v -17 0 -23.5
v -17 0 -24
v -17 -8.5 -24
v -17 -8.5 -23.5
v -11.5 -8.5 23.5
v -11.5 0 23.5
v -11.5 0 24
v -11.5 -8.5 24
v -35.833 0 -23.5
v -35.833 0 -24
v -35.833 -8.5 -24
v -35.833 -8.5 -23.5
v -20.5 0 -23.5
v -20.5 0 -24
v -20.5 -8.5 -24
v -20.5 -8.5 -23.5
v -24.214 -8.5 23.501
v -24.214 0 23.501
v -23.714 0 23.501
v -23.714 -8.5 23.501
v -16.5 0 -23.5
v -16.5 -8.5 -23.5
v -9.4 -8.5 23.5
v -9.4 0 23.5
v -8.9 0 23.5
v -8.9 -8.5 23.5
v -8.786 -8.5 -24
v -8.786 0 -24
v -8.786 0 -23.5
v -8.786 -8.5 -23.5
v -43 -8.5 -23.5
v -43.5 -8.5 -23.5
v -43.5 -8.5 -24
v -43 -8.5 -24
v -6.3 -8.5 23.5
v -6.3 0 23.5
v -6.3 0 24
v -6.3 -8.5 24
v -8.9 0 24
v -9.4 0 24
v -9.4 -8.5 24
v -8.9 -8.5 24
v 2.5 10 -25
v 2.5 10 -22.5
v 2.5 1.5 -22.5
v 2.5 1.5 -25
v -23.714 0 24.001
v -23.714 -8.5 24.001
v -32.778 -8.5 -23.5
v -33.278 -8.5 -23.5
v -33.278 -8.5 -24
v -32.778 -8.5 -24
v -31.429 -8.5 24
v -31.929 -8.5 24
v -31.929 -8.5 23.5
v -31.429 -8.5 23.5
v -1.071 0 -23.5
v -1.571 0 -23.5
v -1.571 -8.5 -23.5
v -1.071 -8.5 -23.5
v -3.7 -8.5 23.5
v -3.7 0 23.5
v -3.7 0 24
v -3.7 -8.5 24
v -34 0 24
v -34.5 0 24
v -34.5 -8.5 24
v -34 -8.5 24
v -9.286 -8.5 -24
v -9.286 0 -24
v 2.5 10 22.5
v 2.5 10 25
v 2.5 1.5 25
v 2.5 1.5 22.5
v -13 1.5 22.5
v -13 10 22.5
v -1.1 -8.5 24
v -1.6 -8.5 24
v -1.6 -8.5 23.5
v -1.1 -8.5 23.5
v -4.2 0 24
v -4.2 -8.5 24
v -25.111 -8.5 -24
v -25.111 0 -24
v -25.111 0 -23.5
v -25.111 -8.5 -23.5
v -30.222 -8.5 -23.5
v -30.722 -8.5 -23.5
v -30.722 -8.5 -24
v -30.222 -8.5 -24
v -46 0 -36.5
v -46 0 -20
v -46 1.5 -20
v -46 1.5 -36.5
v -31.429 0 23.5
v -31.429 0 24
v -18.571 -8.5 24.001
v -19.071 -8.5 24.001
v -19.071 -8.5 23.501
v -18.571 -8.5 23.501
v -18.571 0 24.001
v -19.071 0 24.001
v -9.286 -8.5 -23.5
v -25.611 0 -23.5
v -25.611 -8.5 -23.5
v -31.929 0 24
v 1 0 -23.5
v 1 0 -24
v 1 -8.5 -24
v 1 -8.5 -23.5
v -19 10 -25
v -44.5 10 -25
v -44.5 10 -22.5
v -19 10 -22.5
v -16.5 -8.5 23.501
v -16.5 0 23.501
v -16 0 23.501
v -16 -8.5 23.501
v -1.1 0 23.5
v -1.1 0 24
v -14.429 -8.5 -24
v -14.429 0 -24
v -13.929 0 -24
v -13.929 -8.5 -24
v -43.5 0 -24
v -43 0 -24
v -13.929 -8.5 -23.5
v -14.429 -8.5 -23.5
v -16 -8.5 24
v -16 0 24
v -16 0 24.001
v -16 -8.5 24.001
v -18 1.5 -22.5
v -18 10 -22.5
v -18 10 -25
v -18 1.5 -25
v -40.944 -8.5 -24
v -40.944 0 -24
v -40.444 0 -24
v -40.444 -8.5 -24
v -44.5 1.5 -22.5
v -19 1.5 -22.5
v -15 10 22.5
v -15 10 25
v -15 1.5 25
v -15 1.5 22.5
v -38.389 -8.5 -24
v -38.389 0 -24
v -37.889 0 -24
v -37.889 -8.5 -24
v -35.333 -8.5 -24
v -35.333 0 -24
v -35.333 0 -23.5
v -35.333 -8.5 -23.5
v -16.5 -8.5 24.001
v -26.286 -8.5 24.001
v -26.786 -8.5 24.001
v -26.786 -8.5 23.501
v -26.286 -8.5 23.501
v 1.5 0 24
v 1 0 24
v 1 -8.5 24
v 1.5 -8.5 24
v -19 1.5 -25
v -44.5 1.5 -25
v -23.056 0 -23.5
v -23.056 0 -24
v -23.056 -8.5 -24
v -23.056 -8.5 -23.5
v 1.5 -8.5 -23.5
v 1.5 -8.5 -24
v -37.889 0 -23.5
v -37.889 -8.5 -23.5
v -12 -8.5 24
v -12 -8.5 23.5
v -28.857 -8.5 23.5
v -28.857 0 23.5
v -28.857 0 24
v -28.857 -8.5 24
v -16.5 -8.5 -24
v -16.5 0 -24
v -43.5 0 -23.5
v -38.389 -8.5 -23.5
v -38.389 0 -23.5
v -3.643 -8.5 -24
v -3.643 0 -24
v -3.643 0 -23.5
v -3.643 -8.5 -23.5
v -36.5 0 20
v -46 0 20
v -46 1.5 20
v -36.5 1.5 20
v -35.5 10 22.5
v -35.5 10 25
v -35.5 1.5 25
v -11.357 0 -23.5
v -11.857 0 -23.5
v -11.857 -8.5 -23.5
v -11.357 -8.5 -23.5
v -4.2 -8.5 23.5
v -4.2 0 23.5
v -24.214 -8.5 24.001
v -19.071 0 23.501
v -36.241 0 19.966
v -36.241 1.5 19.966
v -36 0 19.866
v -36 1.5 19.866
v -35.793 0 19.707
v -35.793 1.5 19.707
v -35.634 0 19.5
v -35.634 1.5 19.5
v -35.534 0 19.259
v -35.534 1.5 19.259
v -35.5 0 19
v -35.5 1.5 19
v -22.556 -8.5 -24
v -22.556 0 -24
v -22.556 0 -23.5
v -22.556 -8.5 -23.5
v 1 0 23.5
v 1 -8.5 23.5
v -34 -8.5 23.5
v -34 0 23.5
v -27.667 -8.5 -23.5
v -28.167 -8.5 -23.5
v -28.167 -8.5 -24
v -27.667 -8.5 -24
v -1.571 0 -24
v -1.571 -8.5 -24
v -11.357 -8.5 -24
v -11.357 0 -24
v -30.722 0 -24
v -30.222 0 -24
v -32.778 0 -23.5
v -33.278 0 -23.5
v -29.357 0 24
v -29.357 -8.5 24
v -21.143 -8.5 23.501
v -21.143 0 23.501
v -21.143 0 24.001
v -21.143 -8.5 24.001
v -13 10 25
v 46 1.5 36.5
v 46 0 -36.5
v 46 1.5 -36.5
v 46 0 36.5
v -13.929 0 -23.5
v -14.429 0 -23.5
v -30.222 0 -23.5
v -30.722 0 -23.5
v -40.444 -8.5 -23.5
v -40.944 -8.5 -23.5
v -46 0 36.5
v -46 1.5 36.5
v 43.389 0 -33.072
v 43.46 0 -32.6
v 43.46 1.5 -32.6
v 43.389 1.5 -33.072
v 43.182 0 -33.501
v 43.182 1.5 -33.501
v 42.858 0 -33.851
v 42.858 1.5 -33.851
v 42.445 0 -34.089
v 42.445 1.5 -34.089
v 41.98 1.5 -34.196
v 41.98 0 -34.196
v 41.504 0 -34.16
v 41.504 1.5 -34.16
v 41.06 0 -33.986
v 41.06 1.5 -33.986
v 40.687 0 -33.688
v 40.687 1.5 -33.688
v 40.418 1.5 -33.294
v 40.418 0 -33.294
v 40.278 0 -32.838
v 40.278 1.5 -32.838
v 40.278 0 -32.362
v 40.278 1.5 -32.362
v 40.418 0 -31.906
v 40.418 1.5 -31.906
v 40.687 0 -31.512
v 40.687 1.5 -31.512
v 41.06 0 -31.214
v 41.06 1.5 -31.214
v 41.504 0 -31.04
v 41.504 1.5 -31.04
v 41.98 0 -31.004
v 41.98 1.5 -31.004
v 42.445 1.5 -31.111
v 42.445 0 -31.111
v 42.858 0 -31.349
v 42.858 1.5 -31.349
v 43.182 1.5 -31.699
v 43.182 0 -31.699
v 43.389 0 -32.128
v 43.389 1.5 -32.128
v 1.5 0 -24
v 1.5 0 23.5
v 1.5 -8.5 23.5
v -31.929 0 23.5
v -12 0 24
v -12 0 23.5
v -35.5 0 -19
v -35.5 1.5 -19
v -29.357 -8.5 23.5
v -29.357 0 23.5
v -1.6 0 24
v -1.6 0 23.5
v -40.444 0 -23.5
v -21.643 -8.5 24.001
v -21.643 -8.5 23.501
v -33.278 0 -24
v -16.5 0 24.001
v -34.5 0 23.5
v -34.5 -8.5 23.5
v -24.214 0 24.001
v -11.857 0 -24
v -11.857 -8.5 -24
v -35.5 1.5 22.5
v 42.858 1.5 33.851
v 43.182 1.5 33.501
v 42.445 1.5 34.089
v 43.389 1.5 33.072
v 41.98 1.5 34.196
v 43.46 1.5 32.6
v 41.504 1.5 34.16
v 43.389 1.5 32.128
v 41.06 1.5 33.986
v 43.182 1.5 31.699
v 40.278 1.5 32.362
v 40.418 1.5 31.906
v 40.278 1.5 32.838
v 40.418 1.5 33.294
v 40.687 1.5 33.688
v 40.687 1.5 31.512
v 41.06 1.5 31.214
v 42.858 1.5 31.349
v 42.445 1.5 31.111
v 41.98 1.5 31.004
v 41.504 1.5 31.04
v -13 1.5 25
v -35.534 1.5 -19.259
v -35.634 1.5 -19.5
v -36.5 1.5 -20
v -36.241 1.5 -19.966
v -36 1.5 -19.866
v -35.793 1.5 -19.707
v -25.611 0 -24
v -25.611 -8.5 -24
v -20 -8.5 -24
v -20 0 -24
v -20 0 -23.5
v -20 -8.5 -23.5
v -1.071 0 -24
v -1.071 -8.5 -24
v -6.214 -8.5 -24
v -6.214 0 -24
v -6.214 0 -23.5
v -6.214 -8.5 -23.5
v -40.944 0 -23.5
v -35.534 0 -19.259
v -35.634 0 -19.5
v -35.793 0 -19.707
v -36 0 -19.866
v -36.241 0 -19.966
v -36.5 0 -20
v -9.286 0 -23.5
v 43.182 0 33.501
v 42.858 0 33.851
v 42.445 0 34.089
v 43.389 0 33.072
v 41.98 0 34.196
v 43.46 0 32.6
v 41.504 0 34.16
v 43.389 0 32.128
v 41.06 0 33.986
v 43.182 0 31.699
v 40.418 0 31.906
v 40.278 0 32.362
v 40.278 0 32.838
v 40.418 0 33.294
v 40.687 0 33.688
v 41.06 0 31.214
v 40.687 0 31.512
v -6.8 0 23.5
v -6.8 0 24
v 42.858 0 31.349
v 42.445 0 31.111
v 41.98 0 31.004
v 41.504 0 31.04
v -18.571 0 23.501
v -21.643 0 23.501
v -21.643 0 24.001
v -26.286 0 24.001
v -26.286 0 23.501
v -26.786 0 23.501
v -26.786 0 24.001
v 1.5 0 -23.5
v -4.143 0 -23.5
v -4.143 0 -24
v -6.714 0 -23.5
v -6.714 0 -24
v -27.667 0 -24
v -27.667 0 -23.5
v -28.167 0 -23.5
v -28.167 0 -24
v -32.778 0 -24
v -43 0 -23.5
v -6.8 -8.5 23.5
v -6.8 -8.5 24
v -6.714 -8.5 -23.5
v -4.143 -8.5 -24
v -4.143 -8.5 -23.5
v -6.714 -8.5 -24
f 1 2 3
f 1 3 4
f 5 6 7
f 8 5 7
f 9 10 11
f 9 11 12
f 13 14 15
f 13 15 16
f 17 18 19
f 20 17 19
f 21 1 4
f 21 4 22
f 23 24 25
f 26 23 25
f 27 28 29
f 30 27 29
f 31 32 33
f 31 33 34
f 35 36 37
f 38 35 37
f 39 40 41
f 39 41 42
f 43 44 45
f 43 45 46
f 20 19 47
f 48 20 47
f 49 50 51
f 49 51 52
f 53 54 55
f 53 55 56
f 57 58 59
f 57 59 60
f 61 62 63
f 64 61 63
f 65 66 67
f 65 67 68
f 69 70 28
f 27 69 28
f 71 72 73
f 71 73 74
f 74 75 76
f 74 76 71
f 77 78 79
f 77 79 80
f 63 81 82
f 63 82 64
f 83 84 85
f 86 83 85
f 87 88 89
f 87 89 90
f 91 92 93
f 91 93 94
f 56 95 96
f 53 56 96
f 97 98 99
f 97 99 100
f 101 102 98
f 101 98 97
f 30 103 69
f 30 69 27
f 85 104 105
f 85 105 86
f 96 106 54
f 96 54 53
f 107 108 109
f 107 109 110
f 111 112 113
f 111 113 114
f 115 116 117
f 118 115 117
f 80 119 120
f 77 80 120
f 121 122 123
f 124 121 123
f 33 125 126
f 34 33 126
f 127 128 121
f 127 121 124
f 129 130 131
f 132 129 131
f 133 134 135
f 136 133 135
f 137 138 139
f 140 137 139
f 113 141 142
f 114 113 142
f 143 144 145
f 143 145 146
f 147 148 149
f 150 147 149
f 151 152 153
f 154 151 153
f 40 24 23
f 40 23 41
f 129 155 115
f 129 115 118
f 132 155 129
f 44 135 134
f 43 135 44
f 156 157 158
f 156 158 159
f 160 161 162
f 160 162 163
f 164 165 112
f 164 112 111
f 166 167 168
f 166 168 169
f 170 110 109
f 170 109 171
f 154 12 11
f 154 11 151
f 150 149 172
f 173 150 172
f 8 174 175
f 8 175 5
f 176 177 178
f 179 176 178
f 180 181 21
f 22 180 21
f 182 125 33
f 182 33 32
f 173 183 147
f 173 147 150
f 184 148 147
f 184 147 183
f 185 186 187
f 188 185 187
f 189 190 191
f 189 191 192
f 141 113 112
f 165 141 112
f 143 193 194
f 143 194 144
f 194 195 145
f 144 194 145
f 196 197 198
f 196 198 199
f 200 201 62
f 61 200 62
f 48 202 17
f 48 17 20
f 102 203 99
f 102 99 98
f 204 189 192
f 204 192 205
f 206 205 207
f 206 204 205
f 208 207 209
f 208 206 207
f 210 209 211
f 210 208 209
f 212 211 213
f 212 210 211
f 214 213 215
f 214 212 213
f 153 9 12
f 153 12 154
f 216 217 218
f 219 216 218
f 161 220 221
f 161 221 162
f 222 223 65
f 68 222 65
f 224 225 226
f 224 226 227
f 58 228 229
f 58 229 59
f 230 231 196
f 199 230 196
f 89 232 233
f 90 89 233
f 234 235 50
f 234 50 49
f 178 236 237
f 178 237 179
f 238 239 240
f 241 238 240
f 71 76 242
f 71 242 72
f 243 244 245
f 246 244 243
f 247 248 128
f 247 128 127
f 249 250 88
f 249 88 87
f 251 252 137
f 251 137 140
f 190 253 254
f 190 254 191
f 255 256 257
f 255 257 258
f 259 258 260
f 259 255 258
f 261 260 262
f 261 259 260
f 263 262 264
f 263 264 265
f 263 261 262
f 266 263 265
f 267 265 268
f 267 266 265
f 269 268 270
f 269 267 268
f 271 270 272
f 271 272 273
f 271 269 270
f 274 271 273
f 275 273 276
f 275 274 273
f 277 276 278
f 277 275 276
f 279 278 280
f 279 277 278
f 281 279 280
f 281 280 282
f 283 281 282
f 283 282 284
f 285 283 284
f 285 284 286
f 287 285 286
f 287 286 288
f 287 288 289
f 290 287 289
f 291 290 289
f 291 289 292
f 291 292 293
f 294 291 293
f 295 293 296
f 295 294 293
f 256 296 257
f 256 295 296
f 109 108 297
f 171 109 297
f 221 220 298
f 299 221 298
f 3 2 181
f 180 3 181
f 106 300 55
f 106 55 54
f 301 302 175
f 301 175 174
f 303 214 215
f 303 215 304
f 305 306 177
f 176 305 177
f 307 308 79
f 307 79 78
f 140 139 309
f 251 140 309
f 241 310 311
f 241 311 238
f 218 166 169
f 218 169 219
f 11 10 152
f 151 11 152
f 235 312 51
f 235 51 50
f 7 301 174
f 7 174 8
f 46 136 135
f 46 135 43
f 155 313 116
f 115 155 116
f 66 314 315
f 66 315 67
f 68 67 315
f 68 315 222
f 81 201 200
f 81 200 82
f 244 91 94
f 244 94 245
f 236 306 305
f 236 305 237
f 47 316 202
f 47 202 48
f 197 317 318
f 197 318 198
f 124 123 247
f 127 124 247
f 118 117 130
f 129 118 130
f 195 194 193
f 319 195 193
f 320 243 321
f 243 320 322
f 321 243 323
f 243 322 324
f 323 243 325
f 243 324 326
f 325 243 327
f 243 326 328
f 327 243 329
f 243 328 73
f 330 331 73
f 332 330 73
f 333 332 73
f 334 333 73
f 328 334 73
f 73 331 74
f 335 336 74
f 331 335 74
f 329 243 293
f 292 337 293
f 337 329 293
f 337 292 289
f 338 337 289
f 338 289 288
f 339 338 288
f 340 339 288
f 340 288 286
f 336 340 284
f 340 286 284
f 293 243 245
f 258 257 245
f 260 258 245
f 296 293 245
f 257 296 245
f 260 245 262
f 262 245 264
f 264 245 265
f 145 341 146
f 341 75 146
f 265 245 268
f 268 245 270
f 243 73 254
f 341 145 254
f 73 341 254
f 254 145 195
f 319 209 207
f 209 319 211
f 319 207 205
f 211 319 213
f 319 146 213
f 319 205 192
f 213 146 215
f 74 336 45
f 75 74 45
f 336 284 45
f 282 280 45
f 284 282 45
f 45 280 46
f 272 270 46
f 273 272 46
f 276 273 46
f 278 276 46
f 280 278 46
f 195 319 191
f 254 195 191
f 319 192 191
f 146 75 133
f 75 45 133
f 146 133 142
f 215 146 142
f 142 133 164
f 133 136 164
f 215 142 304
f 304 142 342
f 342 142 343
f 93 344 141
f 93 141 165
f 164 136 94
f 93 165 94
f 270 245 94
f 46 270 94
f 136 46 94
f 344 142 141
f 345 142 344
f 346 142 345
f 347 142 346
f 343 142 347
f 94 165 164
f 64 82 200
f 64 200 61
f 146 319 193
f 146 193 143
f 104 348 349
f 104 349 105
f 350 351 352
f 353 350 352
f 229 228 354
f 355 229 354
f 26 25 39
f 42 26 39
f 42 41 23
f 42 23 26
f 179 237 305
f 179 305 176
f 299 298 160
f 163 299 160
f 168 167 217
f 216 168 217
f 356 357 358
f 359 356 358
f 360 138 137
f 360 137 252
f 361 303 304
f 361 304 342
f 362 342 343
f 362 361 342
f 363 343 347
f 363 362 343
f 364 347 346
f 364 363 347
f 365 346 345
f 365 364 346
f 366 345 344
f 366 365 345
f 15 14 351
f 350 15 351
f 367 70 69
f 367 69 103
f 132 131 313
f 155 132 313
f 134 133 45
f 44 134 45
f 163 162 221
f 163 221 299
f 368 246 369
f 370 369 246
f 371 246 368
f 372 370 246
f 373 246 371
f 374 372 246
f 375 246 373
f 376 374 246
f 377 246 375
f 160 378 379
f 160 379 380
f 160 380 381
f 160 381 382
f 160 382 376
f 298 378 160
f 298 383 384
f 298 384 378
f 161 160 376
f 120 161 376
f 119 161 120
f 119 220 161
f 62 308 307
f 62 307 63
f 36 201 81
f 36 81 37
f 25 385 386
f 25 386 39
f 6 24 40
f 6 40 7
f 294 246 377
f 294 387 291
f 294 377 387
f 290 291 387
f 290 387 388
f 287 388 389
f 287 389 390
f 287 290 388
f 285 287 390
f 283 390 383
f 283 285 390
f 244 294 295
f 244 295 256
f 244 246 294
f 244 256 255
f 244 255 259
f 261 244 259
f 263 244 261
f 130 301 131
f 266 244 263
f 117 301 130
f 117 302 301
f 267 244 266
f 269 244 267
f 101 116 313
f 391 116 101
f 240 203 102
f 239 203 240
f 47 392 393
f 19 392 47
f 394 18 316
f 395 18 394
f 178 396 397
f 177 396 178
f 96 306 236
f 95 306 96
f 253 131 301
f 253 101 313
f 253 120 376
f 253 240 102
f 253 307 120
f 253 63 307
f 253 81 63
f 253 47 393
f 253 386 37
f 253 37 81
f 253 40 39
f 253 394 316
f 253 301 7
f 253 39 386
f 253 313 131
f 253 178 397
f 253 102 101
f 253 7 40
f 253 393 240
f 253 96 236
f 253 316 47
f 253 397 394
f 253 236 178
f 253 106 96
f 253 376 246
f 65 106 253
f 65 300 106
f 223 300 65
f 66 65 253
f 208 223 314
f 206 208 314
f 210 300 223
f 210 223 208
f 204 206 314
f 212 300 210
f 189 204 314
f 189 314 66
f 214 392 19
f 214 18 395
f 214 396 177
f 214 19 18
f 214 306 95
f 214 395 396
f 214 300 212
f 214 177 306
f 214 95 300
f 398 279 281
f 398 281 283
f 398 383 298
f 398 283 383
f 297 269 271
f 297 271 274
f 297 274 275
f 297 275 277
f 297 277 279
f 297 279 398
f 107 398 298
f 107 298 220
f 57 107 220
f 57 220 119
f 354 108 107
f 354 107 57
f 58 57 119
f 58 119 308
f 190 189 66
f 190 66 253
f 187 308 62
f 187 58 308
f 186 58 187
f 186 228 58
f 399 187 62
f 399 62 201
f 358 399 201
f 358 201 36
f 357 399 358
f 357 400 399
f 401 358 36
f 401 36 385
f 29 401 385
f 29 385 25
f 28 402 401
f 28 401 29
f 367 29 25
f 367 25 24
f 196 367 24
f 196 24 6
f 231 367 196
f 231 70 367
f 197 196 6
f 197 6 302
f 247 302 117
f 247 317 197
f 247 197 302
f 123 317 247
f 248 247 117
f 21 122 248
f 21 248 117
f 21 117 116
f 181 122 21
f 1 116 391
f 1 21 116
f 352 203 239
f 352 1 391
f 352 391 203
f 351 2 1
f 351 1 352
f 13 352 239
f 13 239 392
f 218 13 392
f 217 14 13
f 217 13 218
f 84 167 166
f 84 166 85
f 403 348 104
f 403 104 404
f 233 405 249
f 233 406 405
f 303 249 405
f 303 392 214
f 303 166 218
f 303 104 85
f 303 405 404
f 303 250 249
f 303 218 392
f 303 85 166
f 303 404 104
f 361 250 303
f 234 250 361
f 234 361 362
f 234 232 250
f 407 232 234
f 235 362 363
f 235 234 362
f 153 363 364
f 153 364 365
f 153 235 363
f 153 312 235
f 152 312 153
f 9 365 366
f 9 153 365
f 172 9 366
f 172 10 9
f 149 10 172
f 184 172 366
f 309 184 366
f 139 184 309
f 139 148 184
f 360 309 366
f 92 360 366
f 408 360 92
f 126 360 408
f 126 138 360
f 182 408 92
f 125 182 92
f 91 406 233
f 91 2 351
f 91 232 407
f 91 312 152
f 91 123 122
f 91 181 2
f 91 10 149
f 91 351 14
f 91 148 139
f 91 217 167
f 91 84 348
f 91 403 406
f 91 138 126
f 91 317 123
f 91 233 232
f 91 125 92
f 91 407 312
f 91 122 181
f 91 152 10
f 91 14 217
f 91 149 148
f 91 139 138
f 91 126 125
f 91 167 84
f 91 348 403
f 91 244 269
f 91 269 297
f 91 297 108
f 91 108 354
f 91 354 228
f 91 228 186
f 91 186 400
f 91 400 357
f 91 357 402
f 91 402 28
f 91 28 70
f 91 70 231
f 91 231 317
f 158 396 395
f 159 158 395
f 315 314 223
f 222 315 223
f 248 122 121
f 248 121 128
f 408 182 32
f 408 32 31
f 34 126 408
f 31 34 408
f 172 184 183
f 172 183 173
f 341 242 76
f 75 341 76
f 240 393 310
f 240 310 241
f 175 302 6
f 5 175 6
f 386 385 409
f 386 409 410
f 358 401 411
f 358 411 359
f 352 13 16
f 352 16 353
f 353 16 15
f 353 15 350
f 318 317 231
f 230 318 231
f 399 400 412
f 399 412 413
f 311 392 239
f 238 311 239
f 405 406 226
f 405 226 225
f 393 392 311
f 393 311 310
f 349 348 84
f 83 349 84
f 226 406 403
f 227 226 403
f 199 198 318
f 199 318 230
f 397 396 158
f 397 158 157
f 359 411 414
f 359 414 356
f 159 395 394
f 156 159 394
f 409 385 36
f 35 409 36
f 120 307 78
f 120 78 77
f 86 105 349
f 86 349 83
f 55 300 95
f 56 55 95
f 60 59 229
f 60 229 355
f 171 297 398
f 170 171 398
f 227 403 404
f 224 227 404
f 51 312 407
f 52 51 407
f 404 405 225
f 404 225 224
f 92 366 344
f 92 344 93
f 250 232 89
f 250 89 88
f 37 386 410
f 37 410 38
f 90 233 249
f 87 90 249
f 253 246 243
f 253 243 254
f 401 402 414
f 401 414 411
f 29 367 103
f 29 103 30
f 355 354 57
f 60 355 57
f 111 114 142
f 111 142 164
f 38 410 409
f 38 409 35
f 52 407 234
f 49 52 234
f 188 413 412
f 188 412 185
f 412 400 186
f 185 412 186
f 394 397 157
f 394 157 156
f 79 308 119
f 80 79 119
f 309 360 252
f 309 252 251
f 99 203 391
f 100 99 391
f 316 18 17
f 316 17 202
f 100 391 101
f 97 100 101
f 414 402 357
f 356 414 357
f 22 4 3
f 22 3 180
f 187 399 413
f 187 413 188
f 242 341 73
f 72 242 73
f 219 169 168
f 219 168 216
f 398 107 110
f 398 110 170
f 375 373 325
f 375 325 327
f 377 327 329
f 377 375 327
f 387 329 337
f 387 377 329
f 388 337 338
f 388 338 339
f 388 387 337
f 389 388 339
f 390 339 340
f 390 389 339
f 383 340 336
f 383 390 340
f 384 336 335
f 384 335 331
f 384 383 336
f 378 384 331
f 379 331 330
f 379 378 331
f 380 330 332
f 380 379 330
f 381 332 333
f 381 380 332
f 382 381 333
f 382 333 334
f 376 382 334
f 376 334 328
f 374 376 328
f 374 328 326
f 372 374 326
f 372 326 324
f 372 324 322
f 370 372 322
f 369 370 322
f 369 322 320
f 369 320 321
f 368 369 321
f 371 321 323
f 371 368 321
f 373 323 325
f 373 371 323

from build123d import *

# Parameters (mm, degrees)
SZKIC1_R                    = 1.6
DODANIE_WYCI_GNI_CIE1_DEPTH = 1.5
SZKIC2_W                    = 15.5
SZKIC2_H                    = 2.5
SZKIC2_W_2                  = 20.5
SZKIC2_W_3                  = 25.5
DODANIE_WYCI_GNI_CIE2_DEPTH = 8.5
SZKIC3_W                    = 0.5
SZKIC3_H                    = 0.5
DODANIE_WYCI_GNI_CIE3_DEPTH = 8.5


with BuildPart() as part:
    # Szkic1 → Dodanie-wyciągnięcie1 (new body)
    with BuildSketch(Plane(origin=(0, 0, 0), x_dir=(1, 0, 0), z_dir=(0, 1, 0))):
        with BuildLine():
            Line((-46, 36.5), (46, 36.5))
            Line((46, 36.5), (46, -36.5))
            Line((46, -36.5), (-46, -36.5))
            Line((-46, -36.5), (-46, -20))
            Line((-46, -20), (-36.5, -20))
            ThreePointArc((-36.5, -20), (-35.792893219, -19.707106781), (-35.5, -19))
            Line((-35.5, -19), (-35.5, 19))
            ThreePointArc((-35.5, 19), (-35.792893219, 19.707106781), (-36.5, 20))
            Line((-36.5, 20), (-46, 20))
            Line((-46, 20), (-46, 36.5))
        make_face()
        with Locations((41.86, 32.6)):
            Circle(SZKIC1_R, mode=Mode.SUBTRACT)
        with Locations((41.86, -32.6)):
            Circle(SZKIC1_R, mode=Mode.SUBTRACT)
    extrude(amount=DODANIE_WYCI_GNI_CIE1_DEPTH)

    # Szkic2 → Dodanie-wyciągnięcie2 (add)
    with BuildSketch(Plane(origin=(0, 1.5, 0), x_dir=(1, 0, 0), z_dir=(0, 1, 0))):
        with Locations((-5.25, -23.75)):
            Rectangle(SZKIC2_W, SZKIC2_H)
        with Locations((-25.25, -23.75)):
            Rectangle(SZKIC2_W_2, SZKIC2_H)
        with Locations((-7.75, 23.75)):
            Rectangle(SZKIC2_W_2, SZKIC2_H)
        with Locations((-31.75, 23.75)):
            Rectangle(SZKIC2_W_3, SZKIC2_H)
    extrude(amount=DODANIE_WYCI_GNI_CIE2_DEPTH)

    # Szkic3 → Dodanie-wyciągnięcie3 (add)
    with BuildSketch(Plane.XZ):
        with Locations((-43.25, -23.75)):
            Rectangle(SZKIC3_W, SZKIC3_H)
        with Locations((-40.694444444, -23.75)):
            Rectangle(SZKIC3_W, SZKIC3_H)
        with Locations((-38.138888889, -23.75)):
            Rectangle(SZKIC3_W, SZKIC3_H)
        with Locations((-35.583333333, -23.75)):
            Rectangle(SZKIC3_W, SZKIC3_H)
        with Locations((-33.027777778, -23.75)):
            Rectangle(SZKIC3_W, SZKIC3_H)
        with Locations((-30.472222222, -23.75)):
            Rectangle(SZKIC3_W, SZKIC3_H)
        with Locations((-27.916666667, -23.75)):
            Rectangle(SZKIC3_W, SZKIC3_H)
        with Locations((-25.361111111, -23.75)):
            Rectangle(SZKIC3_W, SZKIC3_H)
        with Locations((-22.805555556, -23.75)):
            Rectangle(SZKIC3_W, SZKIC3_H)
        with Locations((-20.25, -23.75)):
            Rectangle(SZKIC3_W, SZKIC3_H)
        with Locations((-16.75, -23.75)):
            Rectangle(SZKIC3_W, SZKIC3_H)
        with Locations((-14.178571429, -23.75)):
            Rectangle(SZKIC3_W, SZKIC3_H)
        with Locations((-11.607142857, -23.75)):
            Rectangle(SZKIC3_W, SZKIC3_H)
        with Locations((-9.035714286, -23.75)):
            Rectangle(SZKIC3_W, SZKIC3_H)
        with Locations((-6.464285714, -23.75)):
            Rectangle(SZKIC3_W, SZKIC3_H)
        with Locations((-3.892857143, -23.75)):
            Rectangle(SZKIC3_W, SZKIC3_H)
        with Locations((-1.321428571, -23.75)):
            Rectangle(SZKIC3_W, SZKIC3_H)
        with Locations((1.25, -23.75)):
            Rectangle(SZKIC3_W, SZKIC3_H)
        with Locations((-34.25, 23.75)):
            Rectangle(SZKIC3_W, SZKIC3_H)
        with Locations((-31.678571432, 23.750167466)):
            Rectangle(SZKIC3_W, SZKIC3_H)
        with Locations((-29.107142864, 23.750334931)):
            Rectangle(SZKIC3_W, SZKIC3_H)
        with Locations((-26.535714297, 23.750502397)):
            Rectangle(SZKIC3_W, SZKIC3_H)
        with Locations((-23.964285729, 23.750669862)):
            Rectangle(SZKIC3_W, SZKIC3_H)
        with Locations((-21.392857161, 23.750837328)):
            Rectangle(SZKIC3_W, SZKIC3_H)
        with Locations((-18.821428593, 23.751004794)):
            Rectangle(SZKIC3_W, SZKIC3_H)
        Polygon((-16, 23.501172259), (-16, 24), (-16.000000025, 24.001172259), (-16.500000025, 24.001172259), (-16.500000025, 23.501172259), align=None)
        with Locations((-11.75, 23.75)):
            Rectangle(SZKIC3_W, SZKIC3_H)
        with Locations((-9.15, 23.75)):
            Rectangle(SZKIC3_W, SZKIC3_H)
        with Locations((-6.55, 23.75)):
            Rectangle(SZKIC3_W, SZKIC3_H)
        with Locations((-3.95, 23.75)):
            Rectangle(SZKIC3_W, SZKIC3_H)
        with Locations((-1.35, 23.75)):
            Rectangle(SZKIC3_W, SZKIC3_H)
        with Locations((1.25, 23.75)):
            Rectangle(SZKIC3_W, SZKIC3_H)
    extrude(amount=DODANIE_WYCI_GNI_CIE3_DEPTH)


solid = part.part
